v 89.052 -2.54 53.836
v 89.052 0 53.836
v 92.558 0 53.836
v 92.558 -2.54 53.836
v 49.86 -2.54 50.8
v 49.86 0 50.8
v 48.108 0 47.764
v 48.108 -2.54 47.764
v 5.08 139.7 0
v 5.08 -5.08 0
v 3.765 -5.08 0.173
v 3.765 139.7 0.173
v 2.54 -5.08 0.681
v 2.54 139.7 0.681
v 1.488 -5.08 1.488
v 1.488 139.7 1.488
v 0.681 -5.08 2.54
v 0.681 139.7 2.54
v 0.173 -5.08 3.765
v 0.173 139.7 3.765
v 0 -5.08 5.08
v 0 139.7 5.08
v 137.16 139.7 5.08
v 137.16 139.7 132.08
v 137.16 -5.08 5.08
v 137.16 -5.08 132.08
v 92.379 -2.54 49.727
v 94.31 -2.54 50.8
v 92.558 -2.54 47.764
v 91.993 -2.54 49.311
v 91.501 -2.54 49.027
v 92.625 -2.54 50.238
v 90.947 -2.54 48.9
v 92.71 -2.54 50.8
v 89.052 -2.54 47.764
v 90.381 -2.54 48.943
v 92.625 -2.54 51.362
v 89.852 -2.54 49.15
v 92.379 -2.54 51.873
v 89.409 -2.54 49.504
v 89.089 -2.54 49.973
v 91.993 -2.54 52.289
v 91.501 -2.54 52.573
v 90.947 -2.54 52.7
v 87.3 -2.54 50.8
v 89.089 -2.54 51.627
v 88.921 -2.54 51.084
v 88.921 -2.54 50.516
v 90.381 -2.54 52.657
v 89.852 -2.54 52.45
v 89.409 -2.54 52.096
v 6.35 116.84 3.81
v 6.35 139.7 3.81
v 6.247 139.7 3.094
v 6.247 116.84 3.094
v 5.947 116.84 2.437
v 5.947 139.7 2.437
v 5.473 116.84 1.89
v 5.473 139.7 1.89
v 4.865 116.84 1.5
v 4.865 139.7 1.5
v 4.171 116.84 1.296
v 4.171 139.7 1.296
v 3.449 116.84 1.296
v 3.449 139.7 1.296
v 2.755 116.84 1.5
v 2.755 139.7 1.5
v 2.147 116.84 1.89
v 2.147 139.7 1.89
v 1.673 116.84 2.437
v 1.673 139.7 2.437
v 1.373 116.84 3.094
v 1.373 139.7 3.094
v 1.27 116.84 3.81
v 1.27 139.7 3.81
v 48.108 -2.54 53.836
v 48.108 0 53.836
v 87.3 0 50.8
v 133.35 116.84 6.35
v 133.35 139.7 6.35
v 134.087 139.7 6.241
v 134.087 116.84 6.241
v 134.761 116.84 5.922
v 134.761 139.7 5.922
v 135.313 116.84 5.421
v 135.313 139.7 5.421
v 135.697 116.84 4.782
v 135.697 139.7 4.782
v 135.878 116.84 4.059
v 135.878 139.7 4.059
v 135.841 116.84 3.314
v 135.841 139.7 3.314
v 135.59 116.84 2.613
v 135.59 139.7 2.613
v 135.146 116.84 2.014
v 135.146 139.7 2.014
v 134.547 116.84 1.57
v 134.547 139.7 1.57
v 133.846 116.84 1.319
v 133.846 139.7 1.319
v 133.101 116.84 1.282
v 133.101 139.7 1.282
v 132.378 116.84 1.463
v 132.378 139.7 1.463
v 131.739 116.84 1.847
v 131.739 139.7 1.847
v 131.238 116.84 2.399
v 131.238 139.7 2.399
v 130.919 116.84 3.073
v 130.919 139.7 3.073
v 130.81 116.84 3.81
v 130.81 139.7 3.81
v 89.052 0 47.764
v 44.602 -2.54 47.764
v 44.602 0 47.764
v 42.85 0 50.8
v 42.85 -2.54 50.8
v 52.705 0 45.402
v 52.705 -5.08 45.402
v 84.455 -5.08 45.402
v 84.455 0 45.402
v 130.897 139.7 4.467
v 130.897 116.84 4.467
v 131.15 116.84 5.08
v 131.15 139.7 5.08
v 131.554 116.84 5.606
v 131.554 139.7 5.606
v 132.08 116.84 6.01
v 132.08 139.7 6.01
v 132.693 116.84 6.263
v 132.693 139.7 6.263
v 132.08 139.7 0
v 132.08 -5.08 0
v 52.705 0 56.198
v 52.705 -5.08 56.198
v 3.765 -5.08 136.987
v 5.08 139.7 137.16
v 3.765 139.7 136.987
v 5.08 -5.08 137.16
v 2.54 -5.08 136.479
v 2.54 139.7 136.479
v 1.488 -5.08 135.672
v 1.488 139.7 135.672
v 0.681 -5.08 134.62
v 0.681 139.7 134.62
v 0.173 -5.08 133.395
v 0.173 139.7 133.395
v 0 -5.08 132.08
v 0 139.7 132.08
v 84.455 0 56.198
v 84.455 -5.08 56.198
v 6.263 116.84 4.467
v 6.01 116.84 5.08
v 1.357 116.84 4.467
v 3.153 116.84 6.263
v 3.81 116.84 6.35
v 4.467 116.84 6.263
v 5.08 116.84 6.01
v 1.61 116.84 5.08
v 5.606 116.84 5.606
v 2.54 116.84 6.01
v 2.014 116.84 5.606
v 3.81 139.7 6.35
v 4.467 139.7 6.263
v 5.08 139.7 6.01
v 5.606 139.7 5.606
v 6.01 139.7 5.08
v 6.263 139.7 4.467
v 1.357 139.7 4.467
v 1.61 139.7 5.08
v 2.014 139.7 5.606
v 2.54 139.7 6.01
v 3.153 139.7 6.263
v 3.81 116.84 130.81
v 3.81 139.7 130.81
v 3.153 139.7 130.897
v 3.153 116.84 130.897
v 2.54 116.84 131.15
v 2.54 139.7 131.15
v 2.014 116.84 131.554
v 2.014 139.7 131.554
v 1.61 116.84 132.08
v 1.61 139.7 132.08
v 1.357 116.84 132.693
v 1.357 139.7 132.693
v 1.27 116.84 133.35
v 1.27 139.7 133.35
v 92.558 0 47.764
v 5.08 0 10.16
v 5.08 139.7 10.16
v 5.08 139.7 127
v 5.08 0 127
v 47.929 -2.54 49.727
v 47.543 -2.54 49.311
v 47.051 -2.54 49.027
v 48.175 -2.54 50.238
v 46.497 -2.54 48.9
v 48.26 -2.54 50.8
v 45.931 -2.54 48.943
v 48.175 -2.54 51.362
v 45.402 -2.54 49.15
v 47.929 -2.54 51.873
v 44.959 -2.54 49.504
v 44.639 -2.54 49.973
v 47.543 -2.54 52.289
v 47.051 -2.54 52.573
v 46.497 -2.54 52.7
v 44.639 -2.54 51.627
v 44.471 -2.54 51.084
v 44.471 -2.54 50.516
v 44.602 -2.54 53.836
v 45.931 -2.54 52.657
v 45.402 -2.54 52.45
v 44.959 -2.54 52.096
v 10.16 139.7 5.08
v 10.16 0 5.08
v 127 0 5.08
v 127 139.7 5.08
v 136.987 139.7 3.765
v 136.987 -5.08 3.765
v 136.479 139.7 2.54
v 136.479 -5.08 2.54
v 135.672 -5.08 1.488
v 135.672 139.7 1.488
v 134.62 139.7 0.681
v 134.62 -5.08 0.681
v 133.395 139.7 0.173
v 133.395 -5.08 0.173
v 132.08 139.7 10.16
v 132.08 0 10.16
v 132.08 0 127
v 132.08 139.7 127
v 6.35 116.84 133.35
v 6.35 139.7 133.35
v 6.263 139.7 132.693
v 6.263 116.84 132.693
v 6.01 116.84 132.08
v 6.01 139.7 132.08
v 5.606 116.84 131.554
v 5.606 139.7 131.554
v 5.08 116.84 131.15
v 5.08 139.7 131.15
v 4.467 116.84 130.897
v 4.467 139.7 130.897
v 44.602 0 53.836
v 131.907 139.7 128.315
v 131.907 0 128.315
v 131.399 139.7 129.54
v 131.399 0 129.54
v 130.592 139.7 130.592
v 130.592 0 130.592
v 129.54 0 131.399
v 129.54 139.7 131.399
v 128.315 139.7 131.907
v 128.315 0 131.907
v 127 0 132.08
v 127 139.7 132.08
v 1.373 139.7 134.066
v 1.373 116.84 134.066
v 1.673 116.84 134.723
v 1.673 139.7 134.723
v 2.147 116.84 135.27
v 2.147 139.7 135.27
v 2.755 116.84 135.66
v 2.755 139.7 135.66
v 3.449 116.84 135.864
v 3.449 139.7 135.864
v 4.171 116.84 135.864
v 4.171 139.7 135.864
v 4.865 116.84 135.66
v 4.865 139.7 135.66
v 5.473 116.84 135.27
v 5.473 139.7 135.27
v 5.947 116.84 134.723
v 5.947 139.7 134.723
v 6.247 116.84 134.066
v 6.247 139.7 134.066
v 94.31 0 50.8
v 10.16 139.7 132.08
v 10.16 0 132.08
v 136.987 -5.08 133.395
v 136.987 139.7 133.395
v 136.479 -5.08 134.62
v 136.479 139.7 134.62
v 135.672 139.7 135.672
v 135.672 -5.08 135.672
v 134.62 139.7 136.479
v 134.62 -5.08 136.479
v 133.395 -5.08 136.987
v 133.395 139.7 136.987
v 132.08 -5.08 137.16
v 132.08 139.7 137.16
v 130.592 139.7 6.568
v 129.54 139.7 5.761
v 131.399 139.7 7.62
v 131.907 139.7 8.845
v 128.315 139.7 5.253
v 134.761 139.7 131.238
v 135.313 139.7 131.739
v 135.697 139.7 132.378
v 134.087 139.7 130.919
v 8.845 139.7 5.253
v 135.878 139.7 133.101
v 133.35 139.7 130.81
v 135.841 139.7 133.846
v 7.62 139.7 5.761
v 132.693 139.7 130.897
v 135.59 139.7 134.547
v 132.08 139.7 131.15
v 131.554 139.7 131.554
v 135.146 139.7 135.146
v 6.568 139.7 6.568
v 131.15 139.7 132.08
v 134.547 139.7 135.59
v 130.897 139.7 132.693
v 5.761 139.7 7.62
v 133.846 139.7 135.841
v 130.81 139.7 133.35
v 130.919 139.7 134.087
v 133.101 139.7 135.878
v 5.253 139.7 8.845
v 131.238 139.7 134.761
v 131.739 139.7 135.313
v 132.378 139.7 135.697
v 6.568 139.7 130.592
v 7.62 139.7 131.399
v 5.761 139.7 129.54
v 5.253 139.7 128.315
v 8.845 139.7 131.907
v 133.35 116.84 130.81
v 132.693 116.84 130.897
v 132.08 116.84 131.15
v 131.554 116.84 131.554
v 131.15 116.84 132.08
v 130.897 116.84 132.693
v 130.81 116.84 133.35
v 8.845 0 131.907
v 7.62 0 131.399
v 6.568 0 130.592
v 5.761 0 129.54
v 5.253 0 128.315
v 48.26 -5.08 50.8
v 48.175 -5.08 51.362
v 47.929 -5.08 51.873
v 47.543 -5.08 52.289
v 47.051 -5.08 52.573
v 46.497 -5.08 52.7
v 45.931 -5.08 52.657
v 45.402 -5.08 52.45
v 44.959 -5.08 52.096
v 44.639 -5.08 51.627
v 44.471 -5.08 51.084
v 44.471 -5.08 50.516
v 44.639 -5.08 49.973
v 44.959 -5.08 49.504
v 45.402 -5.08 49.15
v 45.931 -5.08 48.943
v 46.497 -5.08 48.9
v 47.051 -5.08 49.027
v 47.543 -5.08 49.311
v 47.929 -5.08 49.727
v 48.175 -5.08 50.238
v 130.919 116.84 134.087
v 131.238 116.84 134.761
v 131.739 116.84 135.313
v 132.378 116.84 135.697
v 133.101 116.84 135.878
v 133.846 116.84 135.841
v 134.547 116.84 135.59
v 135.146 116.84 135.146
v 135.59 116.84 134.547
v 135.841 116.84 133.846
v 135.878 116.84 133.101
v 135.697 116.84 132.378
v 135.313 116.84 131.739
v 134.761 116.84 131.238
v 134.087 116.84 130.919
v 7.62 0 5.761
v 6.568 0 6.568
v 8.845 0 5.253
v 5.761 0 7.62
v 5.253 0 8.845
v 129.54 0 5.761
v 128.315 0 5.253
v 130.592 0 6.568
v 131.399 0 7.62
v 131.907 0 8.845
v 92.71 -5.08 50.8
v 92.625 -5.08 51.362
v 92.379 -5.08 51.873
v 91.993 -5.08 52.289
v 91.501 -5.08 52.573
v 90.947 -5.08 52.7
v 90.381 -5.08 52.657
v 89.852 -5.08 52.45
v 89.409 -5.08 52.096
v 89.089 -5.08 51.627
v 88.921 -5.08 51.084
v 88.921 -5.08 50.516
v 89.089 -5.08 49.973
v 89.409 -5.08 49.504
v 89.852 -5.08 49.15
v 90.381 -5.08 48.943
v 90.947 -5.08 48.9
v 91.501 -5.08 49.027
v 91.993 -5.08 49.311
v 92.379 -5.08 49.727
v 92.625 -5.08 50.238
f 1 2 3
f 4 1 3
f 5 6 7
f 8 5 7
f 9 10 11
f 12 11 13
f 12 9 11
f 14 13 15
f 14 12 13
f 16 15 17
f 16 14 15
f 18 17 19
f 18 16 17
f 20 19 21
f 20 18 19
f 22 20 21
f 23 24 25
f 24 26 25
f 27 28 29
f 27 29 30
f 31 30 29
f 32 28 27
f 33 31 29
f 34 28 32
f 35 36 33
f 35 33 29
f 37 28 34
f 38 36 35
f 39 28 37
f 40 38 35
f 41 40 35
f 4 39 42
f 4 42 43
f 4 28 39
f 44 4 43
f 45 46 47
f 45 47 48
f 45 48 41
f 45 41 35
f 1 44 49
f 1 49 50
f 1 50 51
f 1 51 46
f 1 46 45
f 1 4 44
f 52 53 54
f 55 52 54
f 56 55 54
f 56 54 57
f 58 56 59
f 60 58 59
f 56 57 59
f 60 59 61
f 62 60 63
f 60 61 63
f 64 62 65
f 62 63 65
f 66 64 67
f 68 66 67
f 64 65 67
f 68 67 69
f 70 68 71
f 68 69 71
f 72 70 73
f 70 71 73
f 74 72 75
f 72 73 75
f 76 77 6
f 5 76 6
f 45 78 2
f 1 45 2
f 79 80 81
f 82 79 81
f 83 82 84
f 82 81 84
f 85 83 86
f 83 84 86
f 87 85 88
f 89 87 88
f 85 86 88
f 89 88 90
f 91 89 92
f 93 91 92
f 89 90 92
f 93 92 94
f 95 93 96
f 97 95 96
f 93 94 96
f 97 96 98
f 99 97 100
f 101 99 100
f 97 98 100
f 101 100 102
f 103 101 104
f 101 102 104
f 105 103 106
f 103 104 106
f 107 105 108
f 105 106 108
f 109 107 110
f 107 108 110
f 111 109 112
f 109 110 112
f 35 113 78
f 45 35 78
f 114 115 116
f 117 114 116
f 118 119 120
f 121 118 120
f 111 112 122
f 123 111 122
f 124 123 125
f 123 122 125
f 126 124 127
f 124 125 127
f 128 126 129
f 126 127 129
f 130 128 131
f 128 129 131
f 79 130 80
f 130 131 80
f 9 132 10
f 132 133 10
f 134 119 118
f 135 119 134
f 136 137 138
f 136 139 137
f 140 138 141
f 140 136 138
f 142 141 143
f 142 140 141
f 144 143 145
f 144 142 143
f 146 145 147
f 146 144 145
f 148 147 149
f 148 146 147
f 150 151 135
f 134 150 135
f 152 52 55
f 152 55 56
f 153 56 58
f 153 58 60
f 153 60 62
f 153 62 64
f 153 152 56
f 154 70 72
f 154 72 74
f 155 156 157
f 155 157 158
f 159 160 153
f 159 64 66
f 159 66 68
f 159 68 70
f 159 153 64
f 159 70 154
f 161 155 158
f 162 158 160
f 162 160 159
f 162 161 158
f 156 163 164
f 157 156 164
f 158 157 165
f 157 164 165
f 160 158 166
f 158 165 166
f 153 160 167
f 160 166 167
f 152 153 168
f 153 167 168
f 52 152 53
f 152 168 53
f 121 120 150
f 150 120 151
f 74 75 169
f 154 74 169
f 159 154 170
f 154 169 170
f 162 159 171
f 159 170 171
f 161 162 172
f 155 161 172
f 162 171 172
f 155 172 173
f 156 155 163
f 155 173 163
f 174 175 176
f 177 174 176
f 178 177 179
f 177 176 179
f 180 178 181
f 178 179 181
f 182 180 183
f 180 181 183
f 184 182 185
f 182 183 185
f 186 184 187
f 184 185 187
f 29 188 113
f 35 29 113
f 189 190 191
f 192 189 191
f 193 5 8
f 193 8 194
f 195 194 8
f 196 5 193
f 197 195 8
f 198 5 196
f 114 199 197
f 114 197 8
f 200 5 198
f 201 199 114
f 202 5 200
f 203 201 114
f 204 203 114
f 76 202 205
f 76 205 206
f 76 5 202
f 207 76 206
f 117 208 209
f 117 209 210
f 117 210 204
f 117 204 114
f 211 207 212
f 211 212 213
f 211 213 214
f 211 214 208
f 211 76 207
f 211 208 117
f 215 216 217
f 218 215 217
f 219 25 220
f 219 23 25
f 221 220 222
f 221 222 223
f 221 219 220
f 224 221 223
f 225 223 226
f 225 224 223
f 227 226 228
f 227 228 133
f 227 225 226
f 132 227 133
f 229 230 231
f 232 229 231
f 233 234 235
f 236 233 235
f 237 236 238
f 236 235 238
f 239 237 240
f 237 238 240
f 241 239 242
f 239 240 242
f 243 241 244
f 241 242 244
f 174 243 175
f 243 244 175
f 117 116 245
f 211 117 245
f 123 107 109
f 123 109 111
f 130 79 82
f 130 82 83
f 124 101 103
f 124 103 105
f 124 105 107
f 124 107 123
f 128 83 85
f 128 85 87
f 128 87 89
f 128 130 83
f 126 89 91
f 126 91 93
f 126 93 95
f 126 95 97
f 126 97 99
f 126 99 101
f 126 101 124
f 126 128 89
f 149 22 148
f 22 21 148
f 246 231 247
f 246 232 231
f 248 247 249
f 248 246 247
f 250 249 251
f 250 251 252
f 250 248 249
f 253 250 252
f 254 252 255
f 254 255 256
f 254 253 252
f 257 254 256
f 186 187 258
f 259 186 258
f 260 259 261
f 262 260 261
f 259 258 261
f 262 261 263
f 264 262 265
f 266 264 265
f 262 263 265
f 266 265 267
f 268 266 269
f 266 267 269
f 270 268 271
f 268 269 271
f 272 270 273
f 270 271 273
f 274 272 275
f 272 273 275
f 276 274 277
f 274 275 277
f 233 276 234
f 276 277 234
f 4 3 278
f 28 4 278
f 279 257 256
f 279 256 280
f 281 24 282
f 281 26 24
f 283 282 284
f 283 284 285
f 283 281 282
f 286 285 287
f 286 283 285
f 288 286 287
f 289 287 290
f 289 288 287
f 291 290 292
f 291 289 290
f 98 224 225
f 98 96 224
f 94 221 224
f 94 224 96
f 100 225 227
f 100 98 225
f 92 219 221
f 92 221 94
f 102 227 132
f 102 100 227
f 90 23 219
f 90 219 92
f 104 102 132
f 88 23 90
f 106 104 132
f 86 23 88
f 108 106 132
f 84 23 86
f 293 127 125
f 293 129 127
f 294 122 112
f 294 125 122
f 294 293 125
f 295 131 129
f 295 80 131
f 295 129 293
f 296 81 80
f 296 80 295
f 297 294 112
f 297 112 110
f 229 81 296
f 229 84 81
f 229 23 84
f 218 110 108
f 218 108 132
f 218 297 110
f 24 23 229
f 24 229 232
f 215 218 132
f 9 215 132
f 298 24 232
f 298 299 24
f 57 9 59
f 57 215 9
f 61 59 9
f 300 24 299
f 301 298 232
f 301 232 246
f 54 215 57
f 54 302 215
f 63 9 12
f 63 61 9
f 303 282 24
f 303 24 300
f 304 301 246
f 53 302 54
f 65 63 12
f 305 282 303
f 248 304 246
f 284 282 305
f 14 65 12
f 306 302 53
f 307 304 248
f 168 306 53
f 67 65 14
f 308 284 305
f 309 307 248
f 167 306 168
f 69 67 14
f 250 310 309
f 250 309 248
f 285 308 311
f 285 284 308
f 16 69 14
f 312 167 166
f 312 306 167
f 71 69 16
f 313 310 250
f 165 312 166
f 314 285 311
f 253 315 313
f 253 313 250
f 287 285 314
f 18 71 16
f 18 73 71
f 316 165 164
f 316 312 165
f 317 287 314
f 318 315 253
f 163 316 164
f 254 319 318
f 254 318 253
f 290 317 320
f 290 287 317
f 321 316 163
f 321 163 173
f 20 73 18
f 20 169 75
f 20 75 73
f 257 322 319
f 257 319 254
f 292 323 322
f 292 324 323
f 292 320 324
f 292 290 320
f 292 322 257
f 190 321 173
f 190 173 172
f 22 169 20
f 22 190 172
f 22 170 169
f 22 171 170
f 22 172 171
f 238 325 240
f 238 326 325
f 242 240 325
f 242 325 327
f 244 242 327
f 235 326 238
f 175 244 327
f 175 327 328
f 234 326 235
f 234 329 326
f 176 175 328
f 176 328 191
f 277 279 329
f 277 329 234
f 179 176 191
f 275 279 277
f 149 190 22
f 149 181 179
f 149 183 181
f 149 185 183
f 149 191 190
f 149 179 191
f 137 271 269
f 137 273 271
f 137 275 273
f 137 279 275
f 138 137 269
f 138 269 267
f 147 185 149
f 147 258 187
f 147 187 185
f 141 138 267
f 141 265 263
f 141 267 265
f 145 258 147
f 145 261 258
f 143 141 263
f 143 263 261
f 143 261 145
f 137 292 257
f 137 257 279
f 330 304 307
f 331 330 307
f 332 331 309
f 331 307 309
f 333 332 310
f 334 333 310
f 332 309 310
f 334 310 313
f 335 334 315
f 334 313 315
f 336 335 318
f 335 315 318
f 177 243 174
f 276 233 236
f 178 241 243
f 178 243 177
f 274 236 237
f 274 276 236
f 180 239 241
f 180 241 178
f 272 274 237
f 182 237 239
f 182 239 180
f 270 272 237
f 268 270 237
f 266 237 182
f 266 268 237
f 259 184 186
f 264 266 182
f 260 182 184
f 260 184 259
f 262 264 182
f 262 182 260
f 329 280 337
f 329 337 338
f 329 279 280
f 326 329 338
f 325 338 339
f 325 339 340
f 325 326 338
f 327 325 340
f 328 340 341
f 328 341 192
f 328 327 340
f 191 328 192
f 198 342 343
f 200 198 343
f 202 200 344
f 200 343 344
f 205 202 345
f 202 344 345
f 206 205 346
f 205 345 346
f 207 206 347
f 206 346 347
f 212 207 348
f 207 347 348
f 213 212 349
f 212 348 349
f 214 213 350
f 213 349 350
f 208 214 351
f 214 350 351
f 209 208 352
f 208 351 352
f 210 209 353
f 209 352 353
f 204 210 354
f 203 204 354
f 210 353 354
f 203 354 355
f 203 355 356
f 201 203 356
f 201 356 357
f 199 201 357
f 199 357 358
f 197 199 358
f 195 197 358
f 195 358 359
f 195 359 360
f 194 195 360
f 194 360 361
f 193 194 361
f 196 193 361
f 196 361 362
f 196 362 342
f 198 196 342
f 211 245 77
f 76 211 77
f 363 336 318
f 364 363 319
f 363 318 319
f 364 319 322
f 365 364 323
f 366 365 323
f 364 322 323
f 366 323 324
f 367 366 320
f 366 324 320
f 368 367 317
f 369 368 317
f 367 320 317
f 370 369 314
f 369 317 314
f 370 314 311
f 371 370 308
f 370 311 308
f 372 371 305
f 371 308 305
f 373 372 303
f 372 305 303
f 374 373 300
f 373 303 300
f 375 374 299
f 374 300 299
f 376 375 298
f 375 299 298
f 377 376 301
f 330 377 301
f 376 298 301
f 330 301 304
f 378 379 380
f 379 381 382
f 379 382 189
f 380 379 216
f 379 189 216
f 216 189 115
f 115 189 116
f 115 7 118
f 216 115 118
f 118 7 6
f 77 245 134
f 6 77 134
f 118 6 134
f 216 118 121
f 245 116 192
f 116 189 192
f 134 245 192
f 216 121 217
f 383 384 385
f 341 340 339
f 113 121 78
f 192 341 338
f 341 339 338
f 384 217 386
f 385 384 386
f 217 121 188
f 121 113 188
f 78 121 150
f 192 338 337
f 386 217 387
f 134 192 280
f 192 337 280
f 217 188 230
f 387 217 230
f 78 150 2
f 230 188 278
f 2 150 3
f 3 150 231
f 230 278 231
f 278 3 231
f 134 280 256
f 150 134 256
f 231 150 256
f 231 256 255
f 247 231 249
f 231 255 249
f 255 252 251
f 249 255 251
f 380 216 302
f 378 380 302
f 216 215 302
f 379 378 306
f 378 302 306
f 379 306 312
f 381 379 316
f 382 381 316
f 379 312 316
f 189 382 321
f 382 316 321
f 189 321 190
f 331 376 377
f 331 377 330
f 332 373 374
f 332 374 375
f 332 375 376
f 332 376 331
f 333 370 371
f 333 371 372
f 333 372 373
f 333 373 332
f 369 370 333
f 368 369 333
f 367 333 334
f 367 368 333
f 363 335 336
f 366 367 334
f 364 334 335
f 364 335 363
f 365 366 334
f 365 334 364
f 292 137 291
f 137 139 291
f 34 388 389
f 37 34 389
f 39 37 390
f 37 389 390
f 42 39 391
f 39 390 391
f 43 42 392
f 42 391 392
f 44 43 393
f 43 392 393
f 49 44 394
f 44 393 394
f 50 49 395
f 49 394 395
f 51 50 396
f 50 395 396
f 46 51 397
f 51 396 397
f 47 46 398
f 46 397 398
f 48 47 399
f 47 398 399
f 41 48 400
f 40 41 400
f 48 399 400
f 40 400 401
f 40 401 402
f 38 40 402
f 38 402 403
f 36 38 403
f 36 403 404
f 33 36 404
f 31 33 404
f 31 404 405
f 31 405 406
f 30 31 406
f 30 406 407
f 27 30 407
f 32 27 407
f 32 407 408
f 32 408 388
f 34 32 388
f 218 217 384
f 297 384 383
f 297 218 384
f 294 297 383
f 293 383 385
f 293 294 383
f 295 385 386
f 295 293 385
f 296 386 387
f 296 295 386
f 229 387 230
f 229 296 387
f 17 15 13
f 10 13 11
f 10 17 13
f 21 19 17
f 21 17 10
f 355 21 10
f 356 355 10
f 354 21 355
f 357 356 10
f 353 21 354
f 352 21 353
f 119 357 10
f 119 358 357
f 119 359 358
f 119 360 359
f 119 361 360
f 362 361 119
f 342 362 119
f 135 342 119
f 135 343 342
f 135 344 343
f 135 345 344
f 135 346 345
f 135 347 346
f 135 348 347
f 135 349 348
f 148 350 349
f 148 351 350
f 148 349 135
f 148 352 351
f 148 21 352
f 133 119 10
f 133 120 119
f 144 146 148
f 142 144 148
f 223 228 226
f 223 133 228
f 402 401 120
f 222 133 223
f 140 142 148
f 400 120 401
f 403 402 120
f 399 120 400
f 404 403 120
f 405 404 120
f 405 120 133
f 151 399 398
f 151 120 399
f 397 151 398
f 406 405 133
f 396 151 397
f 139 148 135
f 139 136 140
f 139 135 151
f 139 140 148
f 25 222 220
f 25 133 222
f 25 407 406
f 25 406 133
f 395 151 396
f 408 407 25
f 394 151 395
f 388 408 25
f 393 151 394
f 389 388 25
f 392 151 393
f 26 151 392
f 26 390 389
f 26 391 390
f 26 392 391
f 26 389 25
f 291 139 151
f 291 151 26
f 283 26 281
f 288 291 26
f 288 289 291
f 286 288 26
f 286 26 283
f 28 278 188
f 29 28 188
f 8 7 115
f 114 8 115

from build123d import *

# Parameters (mm, degrees)
F0_W      = 137.16
F0_H      = 137.16
F1_DEPTH  = 5.08
F2_W      = 5.08
F2_H      = 127
F3_DEPTH  = 139.7
F4_W      = 15.875
F4_H      = 10.795
F5_DEPTH  = 5.08
F6_R      = 1.905
F7_DEPTH  = 5.08
F8_R      = 5.08
F10_DEPTH = 2.54
F12_DEPTH = 22.86


with BuildPart() as f1:
    # F0 (on Front) → F1 (new body)
    with BuildSketch(Plane.XZ):
        with Locations((68.58, 68.58)):
            Rectangle(F0_W, F0_H)
    extrude(amount=F1_DEPTH)

    # F2 (on face) → F3 (join)
    with BuildSketch(Plane(origin=(0, 0, 0), x_dir=(-1, 0, 0), z_dir=(0, 1, 0))):
        Polygon((-132.08, 137.16), (-137.16, 137.16), (-137.16, 0), (-132.08, 0), (-132.08, 5.08), (-132.08, 132.08), align=None)
        Polygon((0, 137.16), (-132.08, 137.16), (-132.08, 132.08), (-5.08, 132.08), (0, 132.08), align=None)
        Polygon((-132.08, 5.08), (-132.08, 0), (0, 0), (0, 5.08), (-5.08, 5.08), align=None)
        with Locations((-2.54, 68.58)):
            Rectangle(F2_W, F2_H)
    extrude(amount=F3_DEPTH)

    # F4 (on face) → F5 (cut, through all)
    with BuildSketch(Plane.XZ.offset(5.08)):
        with Locations((76.5175, 50.8)):
            Rectangle(F4_W, F4_H)
        with Locations((60.6425, 50.8)):
            Rectangle(F4_W, F4_H)
    extrude(amount=-F5_DEPTH, mode=Mode.SUBTRACT)

    # F6 (on face) → F7 (cut, through all)
    with BuildSketch(Plane.XZ.offset(5.08)):
        with BuildLine():
            ThreePointArc((88.9, 50.8), (90.805, 48.895), (92.71, 50.8))
            ThreePointArc((92.71, 50.8), (90.805, 52.705), (88.9, 50.8))
        make_face()
        with Locations((46.355, 50.8)):
            Circle(F6_R)
    extrude(amount=-F7_DEPTH, mode=Mode.SUBTRACT)

    # F8
    f8_edges = [f1.edges().sort_by_distance(p)[0] for p in [
        (0, 67.31, 137.16),
        (137.16, 67.31, 137.16),
        (0, 67.31, 0),
        (137.16, 67.31, 0),
        (5.08, 69.85, 132.08),
        (132.08, 69.85, 132.08),
        (5.08, 69.85, 5.08),
        (132.08, 69.85, 5.08),
    ]]
    fillet(f8_edges, radius=F8_R)

    # F9 (on face) → F10 (cut)
    with BuildSketch(Plane(origin=(0, 0, 0), x_dir=(-1, 0, 0), z_dir=(0, 1, 0))):
        Polygon((-89.0524, 53.835592), (-92.5576, 53.835592), (-94.3102, 50.8), (-92.5576, 47.764408), (-89.0524, 47.764408), (-87.2998, 50.8), align=None)
        Polygon((-42.8498, 50.8), (-44.6024, 53.835592), (-48.1076, 53.835592), (-49.8602, 50.8), (-48.1076, 47.764408), (-44.6024, 47.764408), align=None)
    extrude(amount=-F10_DEPTH, mode=Mode.SUBTRACT)

    # F11 (on face) → F12 (cut)
    with BuildSketch(Plane(origin=(0, 139.7, 0), x_dir=(-1, 0, 0), z_dir=(0, 1, 0))):
        with BuildLine():
            Line((-133.35, 130.81), (-133.35, 133.35))
            Line((-133.35, 133.35), (-130.81, 133.35))
            ThreePointArc((-130.81, 133.35), (-135.146051, 135.146051), (-133.35, 130.81))
        make_face()
        with BuildLine():
            Line((-130.81, 133.35), (-133.35, 133.35))
            Line((-133.35, 133.35), (-133.35, 130.81))
            ThreePointArc((-133.35, 130.81), (-131.553949, 131.553949), (-130.81, 133.35))
        make_face()
        with BuildLine():
            ThreePointArc((-130.81, 3.81), (-131.553949, 5.606051), (-133.35, 6.35))
            Line((-133.35, 6.35), (-133.35, 3.81))
            Line((-133.35, 3.81), (-130.81, 3.81))
        make_face()
        with BuildLine():
            Line((-133.35, 3.81), (-133.35, 6.35))
            ThreePointArc((-133.35, 6.35), (-135.146051, 2.013949), (-130.81, 3.81))
            Line((-130.81, 3.81), (-133.35, 3.81))
        make_face()
        with BuildLine():
            Line((-3.81, 3.81), (-3.81, 6.35))
            ThreePointArc((-3.81, 6.35), (-5.606051, 5.606051), (-6.35, 3.81))
            Line((-6.35, 3.81), (-3.81, 3.81))
        make_face()
        with BuildLine():
            ThreePointArc((-1.27, 3.81), (-2.013949, 5.606051), (-3.81, 6.35))
            Line((-3.81, 6.35), (-3.81, 3.81))
            Line((-3.81, 3.81), (-6.35, 3.81))
            ThreePointArc((-6.35, 3.81), (-3.81, 1.27), (-1.27, 3.81))
        make_face()
        with BuildLine():
            Line((-3.81, 133.35), (-6.35, 133.35))
            ThreePointArc((-6.35, 133.35), (-5.606051, 131.553949), (-3.81, 130.81))
            Line((-3.81, 130.81), (-3.81, 133.35))
        make_face()
        with BuildLine():
            ThreePointArc((-1.27, 133.35), (-3.81, 135.89), (-6.35, 133.35))
            Line((-6.35, 133.35), (-3.81, 133.35))
            Line((-3.81, 133.35), (-3.81, 130.81))
            ThreePointArc((-3.81, 130.81), (-2.013949, 131.553949), (-1.27, 133.35))
        make_face()
    extrude(amount=-F12_DEPTH, mode=Mode.SUBTRACT)


solid = f1.part
